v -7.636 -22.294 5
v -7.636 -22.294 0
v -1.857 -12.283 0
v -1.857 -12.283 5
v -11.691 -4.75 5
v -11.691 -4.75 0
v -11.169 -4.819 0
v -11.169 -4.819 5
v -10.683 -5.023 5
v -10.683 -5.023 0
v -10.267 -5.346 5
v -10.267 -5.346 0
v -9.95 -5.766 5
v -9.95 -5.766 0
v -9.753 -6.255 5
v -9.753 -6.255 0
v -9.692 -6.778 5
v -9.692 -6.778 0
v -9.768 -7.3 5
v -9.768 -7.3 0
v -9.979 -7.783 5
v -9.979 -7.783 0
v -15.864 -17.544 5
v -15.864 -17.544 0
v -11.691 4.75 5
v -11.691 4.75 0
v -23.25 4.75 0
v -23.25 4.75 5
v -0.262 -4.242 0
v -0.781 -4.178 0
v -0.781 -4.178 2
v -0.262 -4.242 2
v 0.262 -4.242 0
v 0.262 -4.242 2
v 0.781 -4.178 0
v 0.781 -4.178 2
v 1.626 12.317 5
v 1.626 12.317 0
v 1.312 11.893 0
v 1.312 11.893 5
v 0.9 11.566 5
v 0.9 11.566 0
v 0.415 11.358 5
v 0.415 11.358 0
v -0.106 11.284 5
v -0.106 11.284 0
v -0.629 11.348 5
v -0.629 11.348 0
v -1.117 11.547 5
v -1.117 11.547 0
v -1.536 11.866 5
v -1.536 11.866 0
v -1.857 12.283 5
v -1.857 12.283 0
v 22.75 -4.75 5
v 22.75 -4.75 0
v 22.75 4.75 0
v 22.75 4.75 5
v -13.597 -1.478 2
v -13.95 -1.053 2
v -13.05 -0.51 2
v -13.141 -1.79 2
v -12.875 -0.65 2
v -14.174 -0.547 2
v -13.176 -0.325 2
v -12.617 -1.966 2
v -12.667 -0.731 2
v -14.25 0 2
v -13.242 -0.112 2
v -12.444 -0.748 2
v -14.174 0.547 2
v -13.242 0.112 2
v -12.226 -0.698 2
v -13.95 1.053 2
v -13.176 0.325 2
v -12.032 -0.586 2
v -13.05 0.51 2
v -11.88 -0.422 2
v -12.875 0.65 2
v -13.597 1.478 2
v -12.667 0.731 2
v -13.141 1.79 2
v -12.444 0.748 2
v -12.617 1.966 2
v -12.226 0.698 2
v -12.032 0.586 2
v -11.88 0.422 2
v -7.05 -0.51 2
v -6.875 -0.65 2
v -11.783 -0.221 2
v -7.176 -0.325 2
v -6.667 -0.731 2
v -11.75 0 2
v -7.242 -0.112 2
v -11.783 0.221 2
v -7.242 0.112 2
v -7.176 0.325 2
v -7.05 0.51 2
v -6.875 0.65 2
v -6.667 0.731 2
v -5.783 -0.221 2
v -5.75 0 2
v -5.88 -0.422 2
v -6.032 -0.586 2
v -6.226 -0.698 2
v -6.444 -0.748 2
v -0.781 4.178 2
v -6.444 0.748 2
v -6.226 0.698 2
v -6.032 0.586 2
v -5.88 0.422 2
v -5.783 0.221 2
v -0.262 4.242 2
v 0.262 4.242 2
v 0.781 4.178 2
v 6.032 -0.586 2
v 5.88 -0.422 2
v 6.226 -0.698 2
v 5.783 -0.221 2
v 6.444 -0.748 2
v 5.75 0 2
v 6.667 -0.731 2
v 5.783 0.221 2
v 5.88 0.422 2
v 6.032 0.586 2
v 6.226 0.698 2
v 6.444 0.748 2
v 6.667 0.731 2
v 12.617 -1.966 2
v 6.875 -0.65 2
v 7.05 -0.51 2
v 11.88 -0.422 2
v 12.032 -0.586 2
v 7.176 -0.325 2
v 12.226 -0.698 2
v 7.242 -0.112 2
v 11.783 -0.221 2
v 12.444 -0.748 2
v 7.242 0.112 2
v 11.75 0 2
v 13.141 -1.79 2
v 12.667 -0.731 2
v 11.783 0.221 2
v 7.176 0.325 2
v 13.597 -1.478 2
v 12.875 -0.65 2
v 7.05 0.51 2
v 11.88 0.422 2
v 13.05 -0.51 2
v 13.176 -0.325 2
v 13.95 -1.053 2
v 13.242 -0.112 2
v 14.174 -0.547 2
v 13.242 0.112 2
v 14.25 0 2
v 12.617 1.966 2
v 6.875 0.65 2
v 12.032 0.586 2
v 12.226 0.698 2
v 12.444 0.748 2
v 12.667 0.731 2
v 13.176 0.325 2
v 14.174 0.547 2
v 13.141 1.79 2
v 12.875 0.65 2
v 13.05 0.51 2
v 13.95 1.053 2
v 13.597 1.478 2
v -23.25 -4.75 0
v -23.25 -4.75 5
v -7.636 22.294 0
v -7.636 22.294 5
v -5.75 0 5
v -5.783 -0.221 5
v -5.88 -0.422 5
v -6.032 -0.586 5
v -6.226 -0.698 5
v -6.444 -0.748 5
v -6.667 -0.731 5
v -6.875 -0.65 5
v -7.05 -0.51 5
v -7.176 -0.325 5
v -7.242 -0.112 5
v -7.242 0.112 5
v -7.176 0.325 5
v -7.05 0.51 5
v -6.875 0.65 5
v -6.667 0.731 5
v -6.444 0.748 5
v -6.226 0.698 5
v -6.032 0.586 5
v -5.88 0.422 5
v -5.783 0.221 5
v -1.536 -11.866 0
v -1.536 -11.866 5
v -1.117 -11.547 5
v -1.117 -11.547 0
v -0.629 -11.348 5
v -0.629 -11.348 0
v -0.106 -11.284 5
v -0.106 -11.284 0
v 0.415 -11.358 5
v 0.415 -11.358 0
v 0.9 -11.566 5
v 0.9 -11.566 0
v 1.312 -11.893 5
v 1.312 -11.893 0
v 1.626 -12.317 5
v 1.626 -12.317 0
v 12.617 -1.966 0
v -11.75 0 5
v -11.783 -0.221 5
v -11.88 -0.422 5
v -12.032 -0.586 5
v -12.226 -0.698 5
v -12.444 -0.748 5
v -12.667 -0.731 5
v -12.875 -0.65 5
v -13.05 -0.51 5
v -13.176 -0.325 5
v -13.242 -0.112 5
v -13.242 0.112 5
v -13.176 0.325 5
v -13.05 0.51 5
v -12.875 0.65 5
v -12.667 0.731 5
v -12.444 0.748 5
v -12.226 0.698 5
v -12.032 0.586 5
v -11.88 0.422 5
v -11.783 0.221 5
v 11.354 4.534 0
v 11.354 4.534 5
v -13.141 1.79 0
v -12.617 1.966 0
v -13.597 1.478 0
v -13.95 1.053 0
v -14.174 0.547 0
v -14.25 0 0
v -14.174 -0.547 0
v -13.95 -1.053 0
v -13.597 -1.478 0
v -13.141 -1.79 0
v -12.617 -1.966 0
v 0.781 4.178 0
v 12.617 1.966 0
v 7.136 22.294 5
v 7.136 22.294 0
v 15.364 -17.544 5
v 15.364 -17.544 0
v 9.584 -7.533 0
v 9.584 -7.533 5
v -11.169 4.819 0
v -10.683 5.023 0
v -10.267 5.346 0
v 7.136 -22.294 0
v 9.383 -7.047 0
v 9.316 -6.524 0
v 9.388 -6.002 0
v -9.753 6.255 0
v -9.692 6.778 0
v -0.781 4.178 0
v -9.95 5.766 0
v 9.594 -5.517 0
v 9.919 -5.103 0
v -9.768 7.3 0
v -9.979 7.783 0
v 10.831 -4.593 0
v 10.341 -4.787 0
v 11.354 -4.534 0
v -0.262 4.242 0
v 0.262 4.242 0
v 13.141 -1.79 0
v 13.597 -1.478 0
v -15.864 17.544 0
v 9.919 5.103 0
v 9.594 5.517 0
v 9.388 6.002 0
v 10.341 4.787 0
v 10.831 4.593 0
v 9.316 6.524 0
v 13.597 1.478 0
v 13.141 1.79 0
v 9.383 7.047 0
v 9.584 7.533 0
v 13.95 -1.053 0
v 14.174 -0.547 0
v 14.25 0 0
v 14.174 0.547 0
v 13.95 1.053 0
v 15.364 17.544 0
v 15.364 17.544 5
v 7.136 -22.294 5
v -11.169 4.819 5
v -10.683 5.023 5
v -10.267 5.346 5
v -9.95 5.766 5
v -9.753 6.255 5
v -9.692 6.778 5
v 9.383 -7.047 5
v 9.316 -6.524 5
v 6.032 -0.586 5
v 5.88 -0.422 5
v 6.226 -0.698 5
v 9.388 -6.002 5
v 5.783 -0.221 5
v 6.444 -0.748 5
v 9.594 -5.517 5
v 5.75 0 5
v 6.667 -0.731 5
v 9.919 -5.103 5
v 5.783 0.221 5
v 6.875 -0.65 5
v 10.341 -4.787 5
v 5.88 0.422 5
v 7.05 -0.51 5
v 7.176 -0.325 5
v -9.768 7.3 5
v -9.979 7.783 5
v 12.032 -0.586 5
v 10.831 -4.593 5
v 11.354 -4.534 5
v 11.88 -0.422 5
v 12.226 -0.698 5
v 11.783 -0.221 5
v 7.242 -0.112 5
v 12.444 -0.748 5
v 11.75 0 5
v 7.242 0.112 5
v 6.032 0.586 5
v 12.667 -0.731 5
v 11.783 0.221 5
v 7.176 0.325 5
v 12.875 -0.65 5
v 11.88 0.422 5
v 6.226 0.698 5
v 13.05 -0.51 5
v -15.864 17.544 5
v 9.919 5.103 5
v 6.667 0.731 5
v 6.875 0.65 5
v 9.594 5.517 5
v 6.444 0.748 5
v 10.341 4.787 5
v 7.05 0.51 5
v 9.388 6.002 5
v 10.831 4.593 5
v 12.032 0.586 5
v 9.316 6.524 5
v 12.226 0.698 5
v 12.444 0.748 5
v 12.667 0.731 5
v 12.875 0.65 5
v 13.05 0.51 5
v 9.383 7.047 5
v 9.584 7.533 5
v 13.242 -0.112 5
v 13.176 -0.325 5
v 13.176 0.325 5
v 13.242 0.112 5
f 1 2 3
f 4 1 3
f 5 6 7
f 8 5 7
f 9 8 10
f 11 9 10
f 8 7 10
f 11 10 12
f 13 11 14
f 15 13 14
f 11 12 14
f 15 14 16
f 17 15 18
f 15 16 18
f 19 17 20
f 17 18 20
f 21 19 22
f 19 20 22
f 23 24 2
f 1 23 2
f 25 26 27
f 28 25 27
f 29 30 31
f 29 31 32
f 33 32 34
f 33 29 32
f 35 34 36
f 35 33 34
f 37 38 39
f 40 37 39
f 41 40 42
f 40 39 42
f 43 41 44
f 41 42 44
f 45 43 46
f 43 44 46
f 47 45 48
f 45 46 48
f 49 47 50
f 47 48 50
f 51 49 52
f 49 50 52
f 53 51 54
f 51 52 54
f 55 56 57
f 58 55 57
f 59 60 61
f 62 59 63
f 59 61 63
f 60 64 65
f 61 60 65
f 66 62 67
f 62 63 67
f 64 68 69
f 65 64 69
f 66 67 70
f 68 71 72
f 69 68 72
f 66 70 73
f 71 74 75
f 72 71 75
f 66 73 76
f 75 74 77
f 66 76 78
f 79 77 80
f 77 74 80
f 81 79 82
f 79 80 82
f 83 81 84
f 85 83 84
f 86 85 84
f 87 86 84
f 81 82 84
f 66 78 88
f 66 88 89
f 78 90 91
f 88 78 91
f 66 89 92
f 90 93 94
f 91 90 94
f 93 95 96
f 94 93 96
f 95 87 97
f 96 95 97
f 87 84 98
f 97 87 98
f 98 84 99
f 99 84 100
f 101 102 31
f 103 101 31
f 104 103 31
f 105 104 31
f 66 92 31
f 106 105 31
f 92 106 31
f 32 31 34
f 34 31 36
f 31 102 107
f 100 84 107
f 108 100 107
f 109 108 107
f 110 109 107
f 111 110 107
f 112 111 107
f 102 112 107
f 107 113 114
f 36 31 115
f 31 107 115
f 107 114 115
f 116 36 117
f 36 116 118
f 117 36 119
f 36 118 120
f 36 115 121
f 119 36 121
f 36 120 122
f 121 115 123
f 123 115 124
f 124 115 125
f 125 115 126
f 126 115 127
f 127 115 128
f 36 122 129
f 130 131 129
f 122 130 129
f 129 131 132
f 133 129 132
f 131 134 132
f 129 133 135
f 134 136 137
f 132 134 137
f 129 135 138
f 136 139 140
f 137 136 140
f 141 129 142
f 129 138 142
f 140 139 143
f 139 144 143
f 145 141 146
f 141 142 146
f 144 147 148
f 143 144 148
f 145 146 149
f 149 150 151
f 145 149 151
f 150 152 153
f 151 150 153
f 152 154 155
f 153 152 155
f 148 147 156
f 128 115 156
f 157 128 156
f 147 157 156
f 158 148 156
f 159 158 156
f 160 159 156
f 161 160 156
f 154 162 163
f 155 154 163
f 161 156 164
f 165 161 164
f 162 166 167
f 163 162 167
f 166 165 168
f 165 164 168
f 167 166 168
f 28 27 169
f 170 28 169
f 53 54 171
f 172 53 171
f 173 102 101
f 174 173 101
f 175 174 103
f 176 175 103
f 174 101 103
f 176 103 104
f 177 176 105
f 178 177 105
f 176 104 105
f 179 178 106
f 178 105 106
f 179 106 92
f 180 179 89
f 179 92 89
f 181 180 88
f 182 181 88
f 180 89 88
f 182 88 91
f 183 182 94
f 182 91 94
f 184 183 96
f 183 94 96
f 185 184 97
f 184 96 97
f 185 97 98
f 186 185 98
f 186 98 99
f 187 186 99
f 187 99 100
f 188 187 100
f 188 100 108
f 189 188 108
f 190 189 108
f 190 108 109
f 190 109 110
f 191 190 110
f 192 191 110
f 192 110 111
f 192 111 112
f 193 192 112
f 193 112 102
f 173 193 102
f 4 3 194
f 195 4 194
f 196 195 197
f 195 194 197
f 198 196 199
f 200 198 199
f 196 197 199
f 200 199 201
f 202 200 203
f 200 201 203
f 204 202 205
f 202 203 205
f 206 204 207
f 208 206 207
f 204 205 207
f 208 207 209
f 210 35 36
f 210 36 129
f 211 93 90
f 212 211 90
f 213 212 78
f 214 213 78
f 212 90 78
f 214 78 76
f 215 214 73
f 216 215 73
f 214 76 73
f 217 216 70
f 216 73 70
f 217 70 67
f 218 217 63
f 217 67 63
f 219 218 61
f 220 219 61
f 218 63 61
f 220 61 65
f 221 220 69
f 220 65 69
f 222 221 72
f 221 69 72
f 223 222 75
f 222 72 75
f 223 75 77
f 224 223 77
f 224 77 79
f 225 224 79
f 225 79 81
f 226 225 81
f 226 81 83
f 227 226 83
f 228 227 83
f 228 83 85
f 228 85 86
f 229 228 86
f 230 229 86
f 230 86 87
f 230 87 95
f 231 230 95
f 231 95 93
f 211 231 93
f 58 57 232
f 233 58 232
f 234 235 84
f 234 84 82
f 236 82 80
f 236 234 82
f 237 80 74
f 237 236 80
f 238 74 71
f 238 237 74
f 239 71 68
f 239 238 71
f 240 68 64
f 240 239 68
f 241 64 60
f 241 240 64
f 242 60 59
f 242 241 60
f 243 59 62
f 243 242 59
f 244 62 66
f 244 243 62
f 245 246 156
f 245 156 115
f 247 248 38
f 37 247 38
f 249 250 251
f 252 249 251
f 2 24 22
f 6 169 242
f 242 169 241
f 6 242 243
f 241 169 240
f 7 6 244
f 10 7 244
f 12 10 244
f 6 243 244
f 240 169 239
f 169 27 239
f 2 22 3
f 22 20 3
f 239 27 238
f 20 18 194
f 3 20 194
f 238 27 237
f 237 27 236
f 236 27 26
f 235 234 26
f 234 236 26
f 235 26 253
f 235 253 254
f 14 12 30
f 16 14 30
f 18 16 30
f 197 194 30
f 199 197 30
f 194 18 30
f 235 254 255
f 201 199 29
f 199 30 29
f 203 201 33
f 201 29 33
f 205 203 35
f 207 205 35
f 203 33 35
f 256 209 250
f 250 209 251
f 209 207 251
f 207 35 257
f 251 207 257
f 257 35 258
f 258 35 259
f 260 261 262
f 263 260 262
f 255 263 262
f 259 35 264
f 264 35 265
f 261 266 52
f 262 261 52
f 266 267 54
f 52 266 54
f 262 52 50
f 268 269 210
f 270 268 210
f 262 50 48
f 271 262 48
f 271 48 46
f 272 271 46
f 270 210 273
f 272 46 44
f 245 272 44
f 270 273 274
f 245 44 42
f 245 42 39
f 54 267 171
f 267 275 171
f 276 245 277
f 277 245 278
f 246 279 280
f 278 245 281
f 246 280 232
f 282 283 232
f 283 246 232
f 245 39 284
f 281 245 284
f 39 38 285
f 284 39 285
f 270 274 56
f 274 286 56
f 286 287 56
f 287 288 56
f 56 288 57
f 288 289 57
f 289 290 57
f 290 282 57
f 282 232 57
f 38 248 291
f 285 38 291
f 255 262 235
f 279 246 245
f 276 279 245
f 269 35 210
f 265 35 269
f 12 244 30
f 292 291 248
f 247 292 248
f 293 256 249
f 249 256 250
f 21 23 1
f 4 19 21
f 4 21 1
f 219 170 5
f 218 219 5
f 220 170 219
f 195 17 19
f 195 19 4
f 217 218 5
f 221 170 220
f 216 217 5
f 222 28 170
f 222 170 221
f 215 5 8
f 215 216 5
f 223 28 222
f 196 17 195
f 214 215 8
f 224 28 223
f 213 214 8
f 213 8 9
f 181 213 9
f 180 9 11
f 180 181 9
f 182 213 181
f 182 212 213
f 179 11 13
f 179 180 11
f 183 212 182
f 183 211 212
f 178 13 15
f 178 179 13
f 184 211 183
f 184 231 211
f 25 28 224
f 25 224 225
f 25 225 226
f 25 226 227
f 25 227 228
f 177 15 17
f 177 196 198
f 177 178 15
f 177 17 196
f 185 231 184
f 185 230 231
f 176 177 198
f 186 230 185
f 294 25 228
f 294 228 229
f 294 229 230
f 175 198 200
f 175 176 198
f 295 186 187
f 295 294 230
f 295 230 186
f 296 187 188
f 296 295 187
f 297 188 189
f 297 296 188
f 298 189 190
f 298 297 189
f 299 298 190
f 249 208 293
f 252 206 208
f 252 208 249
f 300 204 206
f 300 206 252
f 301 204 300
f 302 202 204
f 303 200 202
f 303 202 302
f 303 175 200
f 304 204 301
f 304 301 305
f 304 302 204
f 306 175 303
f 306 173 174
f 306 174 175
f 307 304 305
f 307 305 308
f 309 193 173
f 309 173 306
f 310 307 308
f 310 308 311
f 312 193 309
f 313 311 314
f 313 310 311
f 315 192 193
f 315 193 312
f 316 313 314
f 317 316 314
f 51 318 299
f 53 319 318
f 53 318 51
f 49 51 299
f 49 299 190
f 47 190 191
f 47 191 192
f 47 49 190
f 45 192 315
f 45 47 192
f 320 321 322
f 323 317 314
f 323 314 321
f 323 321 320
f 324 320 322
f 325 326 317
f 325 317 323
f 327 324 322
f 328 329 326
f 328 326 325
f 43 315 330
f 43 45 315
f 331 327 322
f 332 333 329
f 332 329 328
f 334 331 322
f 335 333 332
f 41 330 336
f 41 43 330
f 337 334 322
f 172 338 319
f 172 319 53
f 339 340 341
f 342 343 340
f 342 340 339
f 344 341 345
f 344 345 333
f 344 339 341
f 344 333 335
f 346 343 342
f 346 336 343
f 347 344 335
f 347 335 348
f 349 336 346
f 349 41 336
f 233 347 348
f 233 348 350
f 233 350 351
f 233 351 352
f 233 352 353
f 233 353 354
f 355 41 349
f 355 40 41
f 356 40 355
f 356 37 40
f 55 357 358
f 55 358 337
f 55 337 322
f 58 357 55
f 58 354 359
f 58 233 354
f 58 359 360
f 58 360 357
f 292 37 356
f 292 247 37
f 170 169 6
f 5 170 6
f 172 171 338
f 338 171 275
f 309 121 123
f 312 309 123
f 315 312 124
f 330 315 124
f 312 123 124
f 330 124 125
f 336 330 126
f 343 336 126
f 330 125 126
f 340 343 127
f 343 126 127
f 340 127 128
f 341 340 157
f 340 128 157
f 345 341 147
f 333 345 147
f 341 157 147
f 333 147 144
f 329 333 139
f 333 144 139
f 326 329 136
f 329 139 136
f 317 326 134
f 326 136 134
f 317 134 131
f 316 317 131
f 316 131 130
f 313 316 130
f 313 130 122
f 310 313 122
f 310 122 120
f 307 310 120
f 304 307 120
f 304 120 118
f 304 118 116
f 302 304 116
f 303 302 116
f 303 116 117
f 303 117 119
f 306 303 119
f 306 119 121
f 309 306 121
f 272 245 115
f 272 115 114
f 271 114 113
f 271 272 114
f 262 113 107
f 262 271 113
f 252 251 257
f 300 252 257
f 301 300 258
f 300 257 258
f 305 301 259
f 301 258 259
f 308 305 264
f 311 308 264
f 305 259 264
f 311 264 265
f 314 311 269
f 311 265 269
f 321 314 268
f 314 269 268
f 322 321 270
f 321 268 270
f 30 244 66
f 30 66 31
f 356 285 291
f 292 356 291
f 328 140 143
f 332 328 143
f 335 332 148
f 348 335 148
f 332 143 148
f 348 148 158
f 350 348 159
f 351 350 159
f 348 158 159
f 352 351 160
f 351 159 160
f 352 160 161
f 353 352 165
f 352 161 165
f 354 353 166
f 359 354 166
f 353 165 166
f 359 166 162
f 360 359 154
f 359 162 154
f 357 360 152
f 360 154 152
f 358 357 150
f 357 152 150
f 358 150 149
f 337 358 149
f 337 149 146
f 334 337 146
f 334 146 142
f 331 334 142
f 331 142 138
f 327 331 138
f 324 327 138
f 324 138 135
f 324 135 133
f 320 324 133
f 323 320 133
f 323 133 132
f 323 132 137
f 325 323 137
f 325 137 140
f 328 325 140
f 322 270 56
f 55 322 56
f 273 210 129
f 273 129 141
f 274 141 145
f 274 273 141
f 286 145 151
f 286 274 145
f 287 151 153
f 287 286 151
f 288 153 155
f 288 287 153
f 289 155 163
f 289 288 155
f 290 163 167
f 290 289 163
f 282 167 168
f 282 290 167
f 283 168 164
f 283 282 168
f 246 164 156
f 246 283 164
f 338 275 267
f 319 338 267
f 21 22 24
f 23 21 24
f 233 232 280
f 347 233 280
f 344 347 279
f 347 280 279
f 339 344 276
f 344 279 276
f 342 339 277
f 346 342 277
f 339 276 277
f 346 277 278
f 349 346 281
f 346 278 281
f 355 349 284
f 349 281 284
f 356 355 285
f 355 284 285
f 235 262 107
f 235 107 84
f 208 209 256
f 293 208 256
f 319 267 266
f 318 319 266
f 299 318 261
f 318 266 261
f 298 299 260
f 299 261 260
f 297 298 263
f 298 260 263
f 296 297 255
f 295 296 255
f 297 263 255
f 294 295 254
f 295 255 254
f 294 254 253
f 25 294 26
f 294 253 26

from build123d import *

# Parameters (mm, degrees)
BOSS_EXTRUDE2_DEPTH = 5
CUT_EXTRUDE1_DEPTH  = 2
SKETCH3_R           = 0.75
CUT_EXTRUDE2_DEPTH  = 33.350678515


with BuildPart() as part:
    # Sketch1 → Boss-Extrude2 (new body)
    with BuildSketch(Plane.XY):
        with BuildLine():
            Line((-23.25, 4.75), (-23.25, -4.75))
            Line((-23.25, -4.75), (-11.691342951, -4.75))
            ThreePointArc((-11.691342951, -4.75), (-9.949887623, -5.766468943), (-9.978567551, -7.78266666))
            Line((-9.978567551, -7.78266666), (-15.863620668, -17.543584287))
            Line((-15.863620668, -17.543584287), (-7.636379332, -22.293584287))
            Line((-7.636379332, -22.293584287), (-1.857050808, -12.283493649))
            ThreePointArc((-1.857050808, -12.283493649), (-0.106035217, -11.283583567), (1.625703261, -12.316519972))
            Line((1.625703261, -12.316519972), (7.136379332, -22.293584287))
            Line((7.136379332, -22.293584287), (15.363620668, -17.543584287))
            Line((15.363620668, -17.543584287), (9.584292144, -7.533493649))
            ThreePointArc((9.584292144, -7.533493649), (9.593852406, -5.517114624), (11.354270812, -4.533853312))
            Line((11.354270812, -4.533853312), (22.75, -4.75))
            Line((22.75, -4.75), (22.75, 4.75))
            Line((22.75, 4.75), (11.354270812, 4.533853312))
            ThreePointArc((11.354270812, 4.533853312), (9.593852406, 5.517114624), (9.584292144, 7.533493649))
            Line((9.584292144, 7.533493649), (15.363620668, 17.543584287))
            Line((15.363620668, 17.543584287), (7.136379332, 22.293584287))
            Line((7.136379332, 22.293584287), (1.625703261, 12.316519972))
            ThreePointArc((1.625703261, 12.316519972), (-0.106035217, 11.283583567), (-1.857050808, 12.283493649))
            Line((-1.857050808, 12.283493649), (-7.636379332, 22.293584287))
            Line((-7.636379332, 22.293584287), (-15.863620668, 17.543584287))
            Line((-15.863620668, 17.543584287), (-9.978567551, 7.78266666))
            ThreePointArc((-9.978567551, 7.78266666), (-9.949887623, 5.766468943), (-11.691342951, 4.75))
            Line((-11.691342951, 4.75), (-23.25, 4.75))
        make_face()
    extrude(amount=BOSS_EXTRUDE2_DEPTH)

    # Sketch2 → Cut-Extrude1 (cut)
    with BuildSketch(Plane(origin=(0, 0, 0), x_dir=(-1, 0, 0), z_dir=(0, 0, -1))):
        with BuildLine():
            Line((0.780612245, 4.177696078), (12.617346939, 1.965974625))
            ThreePointArc((12.617346939, 1.965974625), (14.25, 0), (12.617346939, -1.965974625))
            Line((12.617346939, -1.965974625), (0.780612245, -4.177696078))
            ThreePointArc((0.780612245, -4.177696078), (0, -4.25), (-0.780612245, -4.177696078))
            Line((-0.780612245, -4.177696078), (-12.617346939, -1.965974625))
            ThreePointArc((-12.617346939, -1.965974625), (-14.25, 0), (-12.617346939, 1.965974625))
            Line((-12.617346939, 1.965974625), (-0.780612245, 4.177696078))
            ThreePointArc((-0.780612245, 4.177696078), (0, 4.25), (0.780612245, 4.177696078))
        make_face()
    extrude(amount=-CUT_EXTRUDE1_DEPTH, mode=Mode.SUBTRACT)

    # Sketch3 → Cut-Extrude2 (cut, through all)
    with BuildSketch(Plane(origin=(0, 0, 2), x_dir=(-1, 0, 0), z_dir=(0, 0, -1))):
        with Locations((-6.5, 0)):
            Circle(SKETCH3_R)
        with Locations((-12.5, 0)):
            Circle(SKETCH3_R)
        with Locations(Location((6.5, 0, 0), (0, 0, 180))):
            Circle(SKETCH3_R)
        with Locations(Location((12.5, 0, 0), (0, 0, 180))):
            Circle(SKETCH3_R)
    extrude(amount=-CUT_EXTRUDE2_DEPTH, mode=Mode.SUBTRACT)


solid = part.part
